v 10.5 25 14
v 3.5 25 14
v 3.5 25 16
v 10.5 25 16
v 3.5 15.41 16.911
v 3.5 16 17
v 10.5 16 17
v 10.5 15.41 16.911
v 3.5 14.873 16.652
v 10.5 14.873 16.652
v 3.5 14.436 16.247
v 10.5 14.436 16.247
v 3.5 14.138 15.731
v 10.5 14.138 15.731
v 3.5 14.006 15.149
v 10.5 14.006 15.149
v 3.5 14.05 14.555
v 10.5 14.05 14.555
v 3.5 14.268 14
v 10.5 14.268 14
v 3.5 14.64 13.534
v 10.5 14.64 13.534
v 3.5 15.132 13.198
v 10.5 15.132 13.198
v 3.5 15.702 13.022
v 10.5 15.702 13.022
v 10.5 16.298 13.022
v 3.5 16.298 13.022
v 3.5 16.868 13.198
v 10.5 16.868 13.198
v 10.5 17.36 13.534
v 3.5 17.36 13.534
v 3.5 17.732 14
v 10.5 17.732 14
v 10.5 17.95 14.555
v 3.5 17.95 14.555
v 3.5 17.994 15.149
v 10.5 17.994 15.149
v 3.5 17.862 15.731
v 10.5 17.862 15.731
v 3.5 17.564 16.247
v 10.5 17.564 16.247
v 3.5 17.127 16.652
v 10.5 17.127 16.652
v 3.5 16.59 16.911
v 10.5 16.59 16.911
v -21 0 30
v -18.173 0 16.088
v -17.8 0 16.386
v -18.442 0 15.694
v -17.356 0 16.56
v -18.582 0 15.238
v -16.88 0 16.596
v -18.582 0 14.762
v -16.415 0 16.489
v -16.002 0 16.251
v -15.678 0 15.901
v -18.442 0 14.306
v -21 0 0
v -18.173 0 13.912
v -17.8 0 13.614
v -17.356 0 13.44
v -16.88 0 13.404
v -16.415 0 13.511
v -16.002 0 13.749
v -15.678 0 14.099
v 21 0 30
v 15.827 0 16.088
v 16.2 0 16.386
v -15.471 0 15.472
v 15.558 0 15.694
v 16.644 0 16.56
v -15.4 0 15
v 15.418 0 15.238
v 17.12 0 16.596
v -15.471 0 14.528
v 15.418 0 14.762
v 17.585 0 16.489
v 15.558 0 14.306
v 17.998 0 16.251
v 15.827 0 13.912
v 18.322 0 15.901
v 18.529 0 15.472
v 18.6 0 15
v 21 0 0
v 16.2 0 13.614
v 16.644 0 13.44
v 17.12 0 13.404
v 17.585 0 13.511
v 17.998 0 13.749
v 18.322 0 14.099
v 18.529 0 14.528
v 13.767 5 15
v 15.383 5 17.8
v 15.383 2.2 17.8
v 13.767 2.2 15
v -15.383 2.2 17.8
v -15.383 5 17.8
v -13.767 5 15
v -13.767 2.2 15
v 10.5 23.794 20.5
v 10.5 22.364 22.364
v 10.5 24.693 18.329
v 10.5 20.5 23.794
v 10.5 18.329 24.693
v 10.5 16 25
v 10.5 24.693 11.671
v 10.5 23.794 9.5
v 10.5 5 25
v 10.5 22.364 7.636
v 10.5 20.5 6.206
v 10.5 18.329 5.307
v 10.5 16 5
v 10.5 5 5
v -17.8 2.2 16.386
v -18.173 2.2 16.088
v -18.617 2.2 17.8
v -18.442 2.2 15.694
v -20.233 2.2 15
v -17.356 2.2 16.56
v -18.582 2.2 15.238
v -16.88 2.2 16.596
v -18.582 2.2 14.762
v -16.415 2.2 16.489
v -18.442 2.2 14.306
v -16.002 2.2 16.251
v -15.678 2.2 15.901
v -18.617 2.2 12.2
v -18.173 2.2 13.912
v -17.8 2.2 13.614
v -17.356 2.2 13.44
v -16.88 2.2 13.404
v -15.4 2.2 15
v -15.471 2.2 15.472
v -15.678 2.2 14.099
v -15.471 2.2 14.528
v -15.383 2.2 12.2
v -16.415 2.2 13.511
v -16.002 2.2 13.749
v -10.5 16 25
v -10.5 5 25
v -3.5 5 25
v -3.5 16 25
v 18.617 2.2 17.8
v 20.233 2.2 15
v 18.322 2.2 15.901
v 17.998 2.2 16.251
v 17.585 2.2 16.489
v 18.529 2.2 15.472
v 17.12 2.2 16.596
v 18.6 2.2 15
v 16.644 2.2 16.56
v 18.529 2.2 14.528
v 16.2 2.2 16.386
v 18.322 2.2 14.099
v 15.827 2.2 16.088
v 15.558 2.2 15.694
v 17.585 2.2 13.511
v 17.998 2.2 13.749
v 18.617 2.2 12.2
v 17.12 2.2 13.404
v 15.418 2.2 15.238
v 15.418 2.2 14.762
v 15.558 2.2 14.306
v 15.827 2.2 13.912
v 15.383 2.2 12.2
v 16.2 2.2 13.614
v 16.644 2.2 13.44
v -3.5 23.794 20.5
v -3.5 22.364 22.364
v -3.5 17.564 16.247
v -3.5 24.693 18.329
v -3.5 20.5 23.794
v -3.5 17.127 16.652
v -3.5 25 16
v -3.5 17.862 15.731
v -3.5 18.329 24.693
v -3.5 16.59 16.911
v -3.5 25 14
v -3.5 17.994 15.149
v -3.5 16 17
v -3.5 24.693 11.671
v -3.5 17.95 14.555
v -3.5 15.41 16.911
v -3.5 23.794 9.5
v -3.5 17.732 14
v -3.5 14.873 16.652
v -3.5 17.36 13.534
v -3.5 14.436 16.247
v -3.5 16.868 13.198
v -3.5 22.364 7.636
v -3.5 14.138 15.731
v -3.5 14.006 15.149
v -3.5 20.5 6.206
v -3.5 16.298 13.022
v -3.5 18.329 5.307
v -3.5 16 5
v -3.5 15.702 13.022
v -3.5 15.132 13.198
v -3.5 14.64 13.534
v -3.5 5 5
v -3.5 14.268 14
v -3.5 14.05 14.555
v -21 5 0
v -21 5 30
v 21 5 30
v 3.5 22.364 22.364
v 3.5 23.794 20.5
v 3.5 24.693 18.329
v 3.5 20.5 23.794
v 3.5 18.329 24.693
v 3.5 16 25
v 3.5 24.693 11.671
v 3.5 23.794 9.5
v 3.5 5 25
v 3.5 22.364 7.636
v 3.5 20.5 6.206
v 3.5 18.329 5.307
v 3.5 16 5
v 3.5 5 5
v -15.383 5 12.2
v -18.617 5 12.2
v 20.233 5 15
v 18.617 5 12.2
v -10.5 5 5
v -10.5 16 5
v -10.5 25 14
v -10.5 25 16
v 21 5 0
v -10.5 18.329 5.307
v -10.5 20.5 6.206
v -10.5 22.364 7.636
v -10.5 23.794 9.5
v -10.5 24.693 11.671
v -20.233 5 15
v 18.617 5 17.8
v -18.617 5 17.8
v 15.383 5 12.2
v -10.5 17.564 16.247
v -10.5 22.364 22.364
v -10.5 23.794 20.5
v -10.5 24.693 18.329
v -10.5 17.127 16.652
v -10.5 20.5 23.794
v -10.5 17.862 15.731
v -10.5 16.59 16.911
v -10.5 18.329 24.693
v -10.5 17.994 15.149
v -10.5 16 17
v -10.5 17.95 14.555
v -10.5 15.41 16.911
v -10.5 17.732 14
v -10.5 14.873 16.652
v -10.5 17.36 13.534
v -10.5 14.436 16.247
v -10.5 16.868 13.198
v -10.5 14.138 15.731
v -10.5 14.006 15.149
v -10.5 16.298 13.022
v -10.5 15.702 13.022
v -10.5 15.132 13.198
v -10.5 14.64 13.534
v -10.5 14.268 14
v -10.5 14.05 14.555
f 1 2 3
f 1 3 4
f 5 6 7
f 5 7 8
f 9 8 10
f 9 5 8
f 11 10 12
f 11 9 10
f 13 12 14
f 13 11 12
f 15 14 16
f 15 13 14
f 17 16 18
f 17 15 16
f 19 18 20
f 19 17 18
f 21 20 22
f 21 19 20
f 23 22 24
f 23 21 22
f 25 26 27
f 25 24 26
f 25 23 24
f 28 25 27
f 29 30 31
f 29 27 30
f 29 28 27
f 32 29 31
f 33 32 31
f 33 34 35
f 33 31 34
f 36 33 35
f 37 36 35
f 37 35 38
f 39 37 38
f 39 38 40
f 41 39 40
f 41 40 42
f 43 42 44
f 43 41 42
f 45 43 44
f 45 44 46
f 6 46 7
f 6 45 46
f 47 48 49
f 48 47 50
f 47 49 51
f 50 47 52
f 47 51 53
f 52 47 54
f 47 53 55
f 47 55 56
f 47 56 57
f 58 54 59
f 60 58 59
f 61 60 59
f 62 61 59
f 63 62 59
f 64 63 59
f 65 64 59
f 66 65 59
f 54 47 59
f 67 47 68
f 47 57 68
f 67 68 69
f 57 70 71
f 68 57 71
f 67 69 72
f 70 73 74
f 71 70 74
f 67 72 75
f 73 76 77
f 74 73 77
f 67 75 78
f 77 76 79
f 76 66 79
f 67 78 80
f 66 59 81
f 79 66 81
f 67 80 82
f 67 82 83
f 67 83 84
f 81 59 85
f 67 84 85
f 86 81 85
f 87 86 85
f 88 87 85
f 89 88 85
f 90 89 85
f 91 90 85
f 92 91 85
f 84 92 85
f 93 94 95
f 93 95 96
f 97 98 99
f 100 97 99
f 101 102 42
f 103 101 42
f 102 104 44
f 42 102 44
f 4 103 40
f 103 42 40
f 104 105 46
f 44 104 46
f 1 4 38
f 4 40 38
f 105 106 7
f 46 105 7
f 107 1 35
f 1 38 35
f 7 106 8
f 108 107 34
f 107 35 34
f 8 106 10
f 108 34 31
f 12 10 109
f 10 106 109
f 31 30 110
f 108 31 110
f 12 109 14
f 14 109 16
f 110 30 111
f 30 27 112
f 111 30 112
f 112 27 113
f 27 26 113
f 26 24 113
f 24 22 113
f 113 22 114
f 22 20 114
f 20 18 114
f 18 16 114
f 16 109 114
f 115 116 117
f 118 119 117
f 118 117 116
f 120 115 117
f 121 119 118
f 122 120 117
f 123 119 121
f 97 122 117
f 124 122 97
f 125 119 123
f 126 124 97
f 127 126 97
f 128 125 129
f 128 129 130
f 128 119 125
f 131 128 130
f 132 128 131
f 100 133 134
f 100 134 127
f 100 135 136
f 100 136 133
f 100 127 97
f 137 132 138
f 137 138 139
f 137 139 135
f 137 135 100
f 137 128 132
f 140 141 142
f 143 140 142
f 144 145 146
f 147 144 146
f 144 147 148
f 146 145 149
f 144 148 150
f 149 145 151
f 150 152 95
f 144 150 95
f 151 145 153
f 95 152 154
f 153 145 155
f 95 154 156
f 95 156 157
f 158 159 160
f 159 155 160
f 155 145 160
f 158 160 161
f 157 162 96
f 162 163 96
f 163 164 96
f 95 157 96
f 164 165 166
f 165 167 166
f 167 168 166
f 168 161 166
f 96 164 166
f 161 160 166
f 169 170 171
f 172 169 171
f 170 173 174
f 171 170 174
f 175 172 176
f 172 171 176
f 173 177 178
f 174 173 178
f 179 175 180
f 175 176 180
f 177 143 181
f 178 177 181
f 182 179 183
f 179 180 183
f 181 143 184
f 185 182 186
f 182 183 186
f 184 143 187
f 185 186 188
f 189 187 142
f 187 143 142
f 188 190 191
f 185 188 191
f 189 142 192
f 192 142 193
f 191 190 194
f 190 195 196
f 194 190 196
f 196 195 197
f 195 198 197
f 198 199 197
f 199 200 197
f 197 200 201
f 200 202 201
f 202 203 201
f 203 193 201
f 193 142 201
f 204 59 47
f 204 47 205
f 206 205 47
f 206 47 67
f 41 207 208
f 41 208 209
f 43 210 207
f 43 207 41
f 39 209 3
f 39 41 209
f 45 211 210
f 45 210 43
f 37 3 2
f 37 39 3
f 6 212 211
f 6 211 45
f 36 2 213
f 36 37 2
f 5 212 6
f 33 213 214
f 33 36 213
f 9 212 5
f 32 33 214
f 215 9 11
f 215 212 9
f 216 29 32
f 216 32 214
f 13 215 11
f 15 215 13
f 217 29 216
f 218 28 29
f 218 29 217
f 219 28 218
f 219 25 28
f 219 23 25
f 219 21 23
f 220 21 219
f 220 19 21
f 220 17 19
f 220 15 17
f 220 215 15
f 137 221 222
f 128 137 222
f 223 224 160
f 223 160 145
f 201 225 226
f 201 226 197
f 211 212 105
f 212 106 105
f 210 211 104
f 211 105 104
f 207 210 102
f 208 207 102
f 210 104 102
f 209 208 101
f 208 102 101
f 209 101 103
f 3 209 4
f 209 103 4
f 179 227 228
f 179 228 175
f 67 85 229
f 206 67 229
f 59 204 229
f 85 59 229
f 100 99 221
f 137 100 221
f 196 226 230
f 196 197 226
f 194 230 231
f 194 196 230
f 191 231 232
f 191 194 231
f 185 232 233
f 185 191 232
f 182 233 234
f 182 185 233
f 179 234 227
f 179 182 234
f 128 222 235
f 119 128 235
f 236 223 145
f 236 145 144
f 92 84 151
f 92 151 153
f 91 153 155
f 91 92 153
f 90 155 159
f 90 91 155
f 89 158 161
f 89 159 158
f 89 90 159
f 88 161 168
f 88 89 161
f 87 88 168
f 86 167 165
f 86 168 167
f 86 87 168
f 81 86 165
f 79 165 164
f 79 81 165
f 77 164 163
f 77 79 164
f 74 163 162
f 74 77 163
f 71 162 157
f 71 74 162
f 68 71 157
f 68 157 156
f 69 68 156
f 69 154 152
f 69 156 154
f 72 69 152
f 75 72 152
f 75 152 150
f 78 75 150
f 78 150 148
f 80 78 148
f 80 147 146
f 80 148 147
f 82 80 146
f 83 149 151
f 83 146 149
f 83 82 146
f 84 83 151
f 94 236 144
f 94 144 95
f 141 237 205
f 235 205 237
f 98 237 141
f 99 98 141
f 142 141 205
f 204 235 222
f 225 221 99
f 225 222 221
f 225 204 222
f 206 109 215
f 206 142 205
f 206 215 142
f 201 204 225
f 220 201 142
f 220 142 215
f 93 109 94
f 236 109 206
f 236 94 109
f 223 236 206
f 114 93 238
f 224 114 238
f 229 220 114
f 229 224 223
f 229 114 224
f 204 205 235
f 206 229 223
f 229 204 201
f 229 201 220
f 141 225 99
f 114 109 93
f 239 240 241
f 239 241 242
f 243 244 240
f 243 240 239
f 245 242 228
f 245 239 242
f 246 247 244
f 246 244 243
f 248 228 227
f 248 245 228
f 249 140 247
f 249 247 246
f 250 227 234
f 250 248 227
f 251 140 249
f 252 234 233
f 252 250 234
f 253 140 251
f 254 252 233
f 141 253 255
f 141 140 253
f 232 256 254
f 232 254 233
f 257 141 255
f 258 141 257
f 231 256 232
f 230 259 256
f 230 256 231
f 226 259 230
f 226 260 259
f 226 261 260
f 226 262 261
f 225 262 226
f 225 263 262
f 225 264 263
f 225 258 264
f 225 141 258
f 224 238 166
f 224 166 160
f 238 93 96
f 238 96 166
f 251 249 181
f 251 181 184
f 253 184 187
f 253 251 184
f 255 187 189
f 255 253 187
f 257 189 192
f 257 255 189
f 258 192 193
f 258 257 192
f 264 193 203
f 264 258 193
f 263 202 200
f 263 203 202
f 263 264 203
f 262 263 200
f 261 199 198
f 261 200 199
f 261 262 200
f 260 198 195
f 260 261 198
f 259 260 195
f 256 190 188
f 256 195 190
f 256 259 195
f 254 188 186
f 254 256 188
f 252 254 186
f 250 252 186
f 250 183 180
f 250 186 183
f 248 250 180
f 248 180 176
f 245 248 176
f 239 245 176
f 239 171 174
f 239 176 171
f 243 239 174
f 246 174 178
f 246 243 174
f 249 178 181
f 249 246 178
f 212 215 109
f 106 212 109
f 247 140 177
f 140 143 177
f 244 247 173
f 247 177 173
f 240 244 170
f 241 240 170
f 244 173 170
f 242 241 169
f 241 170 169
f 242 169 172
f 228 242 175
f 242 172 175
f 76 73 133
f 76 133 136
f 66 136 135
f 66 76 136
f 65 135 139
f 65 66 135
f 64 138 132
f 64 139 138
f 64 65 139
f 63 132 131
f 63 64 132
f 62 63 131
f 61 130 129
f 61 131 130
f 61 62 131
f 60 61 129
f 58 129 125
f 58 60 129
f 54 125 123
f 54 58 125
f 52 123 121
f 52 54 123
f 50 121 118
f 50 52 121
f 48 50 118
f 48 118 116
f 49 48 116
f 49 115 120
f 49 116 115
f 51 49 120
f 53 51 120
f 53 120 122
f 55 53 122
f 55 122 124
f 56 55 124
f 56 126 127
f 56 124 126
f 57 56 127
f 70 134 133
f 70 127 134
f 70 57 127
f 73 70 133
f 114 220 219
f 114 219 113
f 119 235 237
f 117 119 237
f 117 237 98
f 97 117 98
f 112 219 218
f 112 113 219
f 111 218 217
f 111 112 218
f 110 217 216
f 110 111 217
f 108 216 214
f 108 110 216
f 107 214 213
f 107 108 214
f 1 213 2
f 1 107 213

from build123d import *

# Parameters (mm, degrees)
CROQUIS1_W                 = 42
CROQUIS1_H                 = 5
SALIENTE_EXTRUIR1_DEPTH    = 30
CORTAR_EXTRUIR1_DEPTH      = 15
CORTAR_EXTRUIR1_DEPTH_BACK = 21
CROQUIS2_R                 = 1.6
CORTAR_EXTRUIR2_DEPTH      = 2.8
CROQUIS4_W                 = 7
CROQUIS4_H                 = 20
SALIENTE_EXTRUIR2_DEPTH    = 20
REDONDEO1_R                = 9
CORTAR_EXTRUIR3_DEPTH      = 11
CORTAR_EXTRUIR3_DEPTH_BACK = 23
CROQUIS5_R                 = 2


with BuildPart() as part:
    # Croquis1 → Saliente-Extruir1 (new body)
    with BuildSketch(Plane.XY):
        with Locations((0, 2.5)):
            Rectangle(CROQUIS1_W, CROQUIS1_H)
    extrude(amount=SALIENTE_EXTRUIR1_DEPTH)

    # Croquis2 → Cortar-Extruir1 (cut, two sides: drawn at the far end of the back side and taken through both)
    with BuildSketch(Plane(origin=(0, 5, 0), x_dir=(1, 0, 0), z_dir=(0, 1, 0)).offset(-CORTAR_EXTRUIR1_DEPTH_BACK)):
        with Locations((-17, -15)):
            Circle(CROQUIS2_R)
        with Locations((17, -15)):
            Circle(CROQUIS2_R)
    extrude(amount=CORTAR_EXTRUIR1_DEPTH + CORTAR_EXTRUIR1_DEPTH_BACK, mode=Mode.SUBTRACT)

    # Croquis3 → Cortar-Extruir2 (cut)
    with BuildSketch(Plane(origin=(0, 5, 0), x_dir=(1, 0, 0), z_dir=(0, 1, 0))):
        Polygon((15.383419246, -17.8), (13.766838493, -15), (15.383419246, -12.2), (18.616580754, -12.2), (20.233161507, -15), (18.616580754, -17.8), align=None)
        Polygon((-13.766838493, -15), (-15.383419246, -12.2), (-18.616580754, -12.2), (-20.233161507, -15), (-18.616580754, -17.8), (-15.383419246, -17.8), align=None)
    extrude(amount=-CORTAR_EXTRUIR2_DEPTH, mode=Mode.SUBTRACT)

    # Croquis4 → Saliente-Extruir2 (add)
    with BuildSketch(Plane(origin=(0, 5, 0), x_dir=(1, 0, 0), z_dir=(0, 1, 0))):
        with Locations((-7, -15)):
            Rectangle(CROQUIS4_W, CROQUIS4_H)
        with Locations((7, -15)):
            Rectangle(CROQUIS4_W, CROQUIS4_H)
    extrude(amount=SALIENTE_EXTRUIR2_DEPTH)

    # Redondeo1
    redondeo1_edges = [part.edges().sort_by_distance(p)[0] for p in [
        (7, 25, 5),
        (7, 25, 25),
        (-7, 25, 25),
        (-7, 25, 5),
    ]]
    fillet(redondeo1_edges, radius=REDONDEO1_R)

    # Croquis5 → Cortar-Extruir3 (cut, two sides: drawn at the far end of the back side and taken through both)
    with BuildSketch(Plane(origin=(10.5, 0, 0), x_dir=(0, 0, -1), z_dir=(1, 0, 0)).offset(-CORTAR_EXTRUIR3_DEPTH_BACK)):
        with Locations(Location((-15, 16, 0), (0, 0, 180))):
            Circle(CROQUIS5_R)
    extrude(amount=CORTAR_EXTRUIR3_DEPTH + CORTAR_EXTRUIR3_DEPTH_BACK, mode=Mode.SUBTRACT)


solid = part.part
